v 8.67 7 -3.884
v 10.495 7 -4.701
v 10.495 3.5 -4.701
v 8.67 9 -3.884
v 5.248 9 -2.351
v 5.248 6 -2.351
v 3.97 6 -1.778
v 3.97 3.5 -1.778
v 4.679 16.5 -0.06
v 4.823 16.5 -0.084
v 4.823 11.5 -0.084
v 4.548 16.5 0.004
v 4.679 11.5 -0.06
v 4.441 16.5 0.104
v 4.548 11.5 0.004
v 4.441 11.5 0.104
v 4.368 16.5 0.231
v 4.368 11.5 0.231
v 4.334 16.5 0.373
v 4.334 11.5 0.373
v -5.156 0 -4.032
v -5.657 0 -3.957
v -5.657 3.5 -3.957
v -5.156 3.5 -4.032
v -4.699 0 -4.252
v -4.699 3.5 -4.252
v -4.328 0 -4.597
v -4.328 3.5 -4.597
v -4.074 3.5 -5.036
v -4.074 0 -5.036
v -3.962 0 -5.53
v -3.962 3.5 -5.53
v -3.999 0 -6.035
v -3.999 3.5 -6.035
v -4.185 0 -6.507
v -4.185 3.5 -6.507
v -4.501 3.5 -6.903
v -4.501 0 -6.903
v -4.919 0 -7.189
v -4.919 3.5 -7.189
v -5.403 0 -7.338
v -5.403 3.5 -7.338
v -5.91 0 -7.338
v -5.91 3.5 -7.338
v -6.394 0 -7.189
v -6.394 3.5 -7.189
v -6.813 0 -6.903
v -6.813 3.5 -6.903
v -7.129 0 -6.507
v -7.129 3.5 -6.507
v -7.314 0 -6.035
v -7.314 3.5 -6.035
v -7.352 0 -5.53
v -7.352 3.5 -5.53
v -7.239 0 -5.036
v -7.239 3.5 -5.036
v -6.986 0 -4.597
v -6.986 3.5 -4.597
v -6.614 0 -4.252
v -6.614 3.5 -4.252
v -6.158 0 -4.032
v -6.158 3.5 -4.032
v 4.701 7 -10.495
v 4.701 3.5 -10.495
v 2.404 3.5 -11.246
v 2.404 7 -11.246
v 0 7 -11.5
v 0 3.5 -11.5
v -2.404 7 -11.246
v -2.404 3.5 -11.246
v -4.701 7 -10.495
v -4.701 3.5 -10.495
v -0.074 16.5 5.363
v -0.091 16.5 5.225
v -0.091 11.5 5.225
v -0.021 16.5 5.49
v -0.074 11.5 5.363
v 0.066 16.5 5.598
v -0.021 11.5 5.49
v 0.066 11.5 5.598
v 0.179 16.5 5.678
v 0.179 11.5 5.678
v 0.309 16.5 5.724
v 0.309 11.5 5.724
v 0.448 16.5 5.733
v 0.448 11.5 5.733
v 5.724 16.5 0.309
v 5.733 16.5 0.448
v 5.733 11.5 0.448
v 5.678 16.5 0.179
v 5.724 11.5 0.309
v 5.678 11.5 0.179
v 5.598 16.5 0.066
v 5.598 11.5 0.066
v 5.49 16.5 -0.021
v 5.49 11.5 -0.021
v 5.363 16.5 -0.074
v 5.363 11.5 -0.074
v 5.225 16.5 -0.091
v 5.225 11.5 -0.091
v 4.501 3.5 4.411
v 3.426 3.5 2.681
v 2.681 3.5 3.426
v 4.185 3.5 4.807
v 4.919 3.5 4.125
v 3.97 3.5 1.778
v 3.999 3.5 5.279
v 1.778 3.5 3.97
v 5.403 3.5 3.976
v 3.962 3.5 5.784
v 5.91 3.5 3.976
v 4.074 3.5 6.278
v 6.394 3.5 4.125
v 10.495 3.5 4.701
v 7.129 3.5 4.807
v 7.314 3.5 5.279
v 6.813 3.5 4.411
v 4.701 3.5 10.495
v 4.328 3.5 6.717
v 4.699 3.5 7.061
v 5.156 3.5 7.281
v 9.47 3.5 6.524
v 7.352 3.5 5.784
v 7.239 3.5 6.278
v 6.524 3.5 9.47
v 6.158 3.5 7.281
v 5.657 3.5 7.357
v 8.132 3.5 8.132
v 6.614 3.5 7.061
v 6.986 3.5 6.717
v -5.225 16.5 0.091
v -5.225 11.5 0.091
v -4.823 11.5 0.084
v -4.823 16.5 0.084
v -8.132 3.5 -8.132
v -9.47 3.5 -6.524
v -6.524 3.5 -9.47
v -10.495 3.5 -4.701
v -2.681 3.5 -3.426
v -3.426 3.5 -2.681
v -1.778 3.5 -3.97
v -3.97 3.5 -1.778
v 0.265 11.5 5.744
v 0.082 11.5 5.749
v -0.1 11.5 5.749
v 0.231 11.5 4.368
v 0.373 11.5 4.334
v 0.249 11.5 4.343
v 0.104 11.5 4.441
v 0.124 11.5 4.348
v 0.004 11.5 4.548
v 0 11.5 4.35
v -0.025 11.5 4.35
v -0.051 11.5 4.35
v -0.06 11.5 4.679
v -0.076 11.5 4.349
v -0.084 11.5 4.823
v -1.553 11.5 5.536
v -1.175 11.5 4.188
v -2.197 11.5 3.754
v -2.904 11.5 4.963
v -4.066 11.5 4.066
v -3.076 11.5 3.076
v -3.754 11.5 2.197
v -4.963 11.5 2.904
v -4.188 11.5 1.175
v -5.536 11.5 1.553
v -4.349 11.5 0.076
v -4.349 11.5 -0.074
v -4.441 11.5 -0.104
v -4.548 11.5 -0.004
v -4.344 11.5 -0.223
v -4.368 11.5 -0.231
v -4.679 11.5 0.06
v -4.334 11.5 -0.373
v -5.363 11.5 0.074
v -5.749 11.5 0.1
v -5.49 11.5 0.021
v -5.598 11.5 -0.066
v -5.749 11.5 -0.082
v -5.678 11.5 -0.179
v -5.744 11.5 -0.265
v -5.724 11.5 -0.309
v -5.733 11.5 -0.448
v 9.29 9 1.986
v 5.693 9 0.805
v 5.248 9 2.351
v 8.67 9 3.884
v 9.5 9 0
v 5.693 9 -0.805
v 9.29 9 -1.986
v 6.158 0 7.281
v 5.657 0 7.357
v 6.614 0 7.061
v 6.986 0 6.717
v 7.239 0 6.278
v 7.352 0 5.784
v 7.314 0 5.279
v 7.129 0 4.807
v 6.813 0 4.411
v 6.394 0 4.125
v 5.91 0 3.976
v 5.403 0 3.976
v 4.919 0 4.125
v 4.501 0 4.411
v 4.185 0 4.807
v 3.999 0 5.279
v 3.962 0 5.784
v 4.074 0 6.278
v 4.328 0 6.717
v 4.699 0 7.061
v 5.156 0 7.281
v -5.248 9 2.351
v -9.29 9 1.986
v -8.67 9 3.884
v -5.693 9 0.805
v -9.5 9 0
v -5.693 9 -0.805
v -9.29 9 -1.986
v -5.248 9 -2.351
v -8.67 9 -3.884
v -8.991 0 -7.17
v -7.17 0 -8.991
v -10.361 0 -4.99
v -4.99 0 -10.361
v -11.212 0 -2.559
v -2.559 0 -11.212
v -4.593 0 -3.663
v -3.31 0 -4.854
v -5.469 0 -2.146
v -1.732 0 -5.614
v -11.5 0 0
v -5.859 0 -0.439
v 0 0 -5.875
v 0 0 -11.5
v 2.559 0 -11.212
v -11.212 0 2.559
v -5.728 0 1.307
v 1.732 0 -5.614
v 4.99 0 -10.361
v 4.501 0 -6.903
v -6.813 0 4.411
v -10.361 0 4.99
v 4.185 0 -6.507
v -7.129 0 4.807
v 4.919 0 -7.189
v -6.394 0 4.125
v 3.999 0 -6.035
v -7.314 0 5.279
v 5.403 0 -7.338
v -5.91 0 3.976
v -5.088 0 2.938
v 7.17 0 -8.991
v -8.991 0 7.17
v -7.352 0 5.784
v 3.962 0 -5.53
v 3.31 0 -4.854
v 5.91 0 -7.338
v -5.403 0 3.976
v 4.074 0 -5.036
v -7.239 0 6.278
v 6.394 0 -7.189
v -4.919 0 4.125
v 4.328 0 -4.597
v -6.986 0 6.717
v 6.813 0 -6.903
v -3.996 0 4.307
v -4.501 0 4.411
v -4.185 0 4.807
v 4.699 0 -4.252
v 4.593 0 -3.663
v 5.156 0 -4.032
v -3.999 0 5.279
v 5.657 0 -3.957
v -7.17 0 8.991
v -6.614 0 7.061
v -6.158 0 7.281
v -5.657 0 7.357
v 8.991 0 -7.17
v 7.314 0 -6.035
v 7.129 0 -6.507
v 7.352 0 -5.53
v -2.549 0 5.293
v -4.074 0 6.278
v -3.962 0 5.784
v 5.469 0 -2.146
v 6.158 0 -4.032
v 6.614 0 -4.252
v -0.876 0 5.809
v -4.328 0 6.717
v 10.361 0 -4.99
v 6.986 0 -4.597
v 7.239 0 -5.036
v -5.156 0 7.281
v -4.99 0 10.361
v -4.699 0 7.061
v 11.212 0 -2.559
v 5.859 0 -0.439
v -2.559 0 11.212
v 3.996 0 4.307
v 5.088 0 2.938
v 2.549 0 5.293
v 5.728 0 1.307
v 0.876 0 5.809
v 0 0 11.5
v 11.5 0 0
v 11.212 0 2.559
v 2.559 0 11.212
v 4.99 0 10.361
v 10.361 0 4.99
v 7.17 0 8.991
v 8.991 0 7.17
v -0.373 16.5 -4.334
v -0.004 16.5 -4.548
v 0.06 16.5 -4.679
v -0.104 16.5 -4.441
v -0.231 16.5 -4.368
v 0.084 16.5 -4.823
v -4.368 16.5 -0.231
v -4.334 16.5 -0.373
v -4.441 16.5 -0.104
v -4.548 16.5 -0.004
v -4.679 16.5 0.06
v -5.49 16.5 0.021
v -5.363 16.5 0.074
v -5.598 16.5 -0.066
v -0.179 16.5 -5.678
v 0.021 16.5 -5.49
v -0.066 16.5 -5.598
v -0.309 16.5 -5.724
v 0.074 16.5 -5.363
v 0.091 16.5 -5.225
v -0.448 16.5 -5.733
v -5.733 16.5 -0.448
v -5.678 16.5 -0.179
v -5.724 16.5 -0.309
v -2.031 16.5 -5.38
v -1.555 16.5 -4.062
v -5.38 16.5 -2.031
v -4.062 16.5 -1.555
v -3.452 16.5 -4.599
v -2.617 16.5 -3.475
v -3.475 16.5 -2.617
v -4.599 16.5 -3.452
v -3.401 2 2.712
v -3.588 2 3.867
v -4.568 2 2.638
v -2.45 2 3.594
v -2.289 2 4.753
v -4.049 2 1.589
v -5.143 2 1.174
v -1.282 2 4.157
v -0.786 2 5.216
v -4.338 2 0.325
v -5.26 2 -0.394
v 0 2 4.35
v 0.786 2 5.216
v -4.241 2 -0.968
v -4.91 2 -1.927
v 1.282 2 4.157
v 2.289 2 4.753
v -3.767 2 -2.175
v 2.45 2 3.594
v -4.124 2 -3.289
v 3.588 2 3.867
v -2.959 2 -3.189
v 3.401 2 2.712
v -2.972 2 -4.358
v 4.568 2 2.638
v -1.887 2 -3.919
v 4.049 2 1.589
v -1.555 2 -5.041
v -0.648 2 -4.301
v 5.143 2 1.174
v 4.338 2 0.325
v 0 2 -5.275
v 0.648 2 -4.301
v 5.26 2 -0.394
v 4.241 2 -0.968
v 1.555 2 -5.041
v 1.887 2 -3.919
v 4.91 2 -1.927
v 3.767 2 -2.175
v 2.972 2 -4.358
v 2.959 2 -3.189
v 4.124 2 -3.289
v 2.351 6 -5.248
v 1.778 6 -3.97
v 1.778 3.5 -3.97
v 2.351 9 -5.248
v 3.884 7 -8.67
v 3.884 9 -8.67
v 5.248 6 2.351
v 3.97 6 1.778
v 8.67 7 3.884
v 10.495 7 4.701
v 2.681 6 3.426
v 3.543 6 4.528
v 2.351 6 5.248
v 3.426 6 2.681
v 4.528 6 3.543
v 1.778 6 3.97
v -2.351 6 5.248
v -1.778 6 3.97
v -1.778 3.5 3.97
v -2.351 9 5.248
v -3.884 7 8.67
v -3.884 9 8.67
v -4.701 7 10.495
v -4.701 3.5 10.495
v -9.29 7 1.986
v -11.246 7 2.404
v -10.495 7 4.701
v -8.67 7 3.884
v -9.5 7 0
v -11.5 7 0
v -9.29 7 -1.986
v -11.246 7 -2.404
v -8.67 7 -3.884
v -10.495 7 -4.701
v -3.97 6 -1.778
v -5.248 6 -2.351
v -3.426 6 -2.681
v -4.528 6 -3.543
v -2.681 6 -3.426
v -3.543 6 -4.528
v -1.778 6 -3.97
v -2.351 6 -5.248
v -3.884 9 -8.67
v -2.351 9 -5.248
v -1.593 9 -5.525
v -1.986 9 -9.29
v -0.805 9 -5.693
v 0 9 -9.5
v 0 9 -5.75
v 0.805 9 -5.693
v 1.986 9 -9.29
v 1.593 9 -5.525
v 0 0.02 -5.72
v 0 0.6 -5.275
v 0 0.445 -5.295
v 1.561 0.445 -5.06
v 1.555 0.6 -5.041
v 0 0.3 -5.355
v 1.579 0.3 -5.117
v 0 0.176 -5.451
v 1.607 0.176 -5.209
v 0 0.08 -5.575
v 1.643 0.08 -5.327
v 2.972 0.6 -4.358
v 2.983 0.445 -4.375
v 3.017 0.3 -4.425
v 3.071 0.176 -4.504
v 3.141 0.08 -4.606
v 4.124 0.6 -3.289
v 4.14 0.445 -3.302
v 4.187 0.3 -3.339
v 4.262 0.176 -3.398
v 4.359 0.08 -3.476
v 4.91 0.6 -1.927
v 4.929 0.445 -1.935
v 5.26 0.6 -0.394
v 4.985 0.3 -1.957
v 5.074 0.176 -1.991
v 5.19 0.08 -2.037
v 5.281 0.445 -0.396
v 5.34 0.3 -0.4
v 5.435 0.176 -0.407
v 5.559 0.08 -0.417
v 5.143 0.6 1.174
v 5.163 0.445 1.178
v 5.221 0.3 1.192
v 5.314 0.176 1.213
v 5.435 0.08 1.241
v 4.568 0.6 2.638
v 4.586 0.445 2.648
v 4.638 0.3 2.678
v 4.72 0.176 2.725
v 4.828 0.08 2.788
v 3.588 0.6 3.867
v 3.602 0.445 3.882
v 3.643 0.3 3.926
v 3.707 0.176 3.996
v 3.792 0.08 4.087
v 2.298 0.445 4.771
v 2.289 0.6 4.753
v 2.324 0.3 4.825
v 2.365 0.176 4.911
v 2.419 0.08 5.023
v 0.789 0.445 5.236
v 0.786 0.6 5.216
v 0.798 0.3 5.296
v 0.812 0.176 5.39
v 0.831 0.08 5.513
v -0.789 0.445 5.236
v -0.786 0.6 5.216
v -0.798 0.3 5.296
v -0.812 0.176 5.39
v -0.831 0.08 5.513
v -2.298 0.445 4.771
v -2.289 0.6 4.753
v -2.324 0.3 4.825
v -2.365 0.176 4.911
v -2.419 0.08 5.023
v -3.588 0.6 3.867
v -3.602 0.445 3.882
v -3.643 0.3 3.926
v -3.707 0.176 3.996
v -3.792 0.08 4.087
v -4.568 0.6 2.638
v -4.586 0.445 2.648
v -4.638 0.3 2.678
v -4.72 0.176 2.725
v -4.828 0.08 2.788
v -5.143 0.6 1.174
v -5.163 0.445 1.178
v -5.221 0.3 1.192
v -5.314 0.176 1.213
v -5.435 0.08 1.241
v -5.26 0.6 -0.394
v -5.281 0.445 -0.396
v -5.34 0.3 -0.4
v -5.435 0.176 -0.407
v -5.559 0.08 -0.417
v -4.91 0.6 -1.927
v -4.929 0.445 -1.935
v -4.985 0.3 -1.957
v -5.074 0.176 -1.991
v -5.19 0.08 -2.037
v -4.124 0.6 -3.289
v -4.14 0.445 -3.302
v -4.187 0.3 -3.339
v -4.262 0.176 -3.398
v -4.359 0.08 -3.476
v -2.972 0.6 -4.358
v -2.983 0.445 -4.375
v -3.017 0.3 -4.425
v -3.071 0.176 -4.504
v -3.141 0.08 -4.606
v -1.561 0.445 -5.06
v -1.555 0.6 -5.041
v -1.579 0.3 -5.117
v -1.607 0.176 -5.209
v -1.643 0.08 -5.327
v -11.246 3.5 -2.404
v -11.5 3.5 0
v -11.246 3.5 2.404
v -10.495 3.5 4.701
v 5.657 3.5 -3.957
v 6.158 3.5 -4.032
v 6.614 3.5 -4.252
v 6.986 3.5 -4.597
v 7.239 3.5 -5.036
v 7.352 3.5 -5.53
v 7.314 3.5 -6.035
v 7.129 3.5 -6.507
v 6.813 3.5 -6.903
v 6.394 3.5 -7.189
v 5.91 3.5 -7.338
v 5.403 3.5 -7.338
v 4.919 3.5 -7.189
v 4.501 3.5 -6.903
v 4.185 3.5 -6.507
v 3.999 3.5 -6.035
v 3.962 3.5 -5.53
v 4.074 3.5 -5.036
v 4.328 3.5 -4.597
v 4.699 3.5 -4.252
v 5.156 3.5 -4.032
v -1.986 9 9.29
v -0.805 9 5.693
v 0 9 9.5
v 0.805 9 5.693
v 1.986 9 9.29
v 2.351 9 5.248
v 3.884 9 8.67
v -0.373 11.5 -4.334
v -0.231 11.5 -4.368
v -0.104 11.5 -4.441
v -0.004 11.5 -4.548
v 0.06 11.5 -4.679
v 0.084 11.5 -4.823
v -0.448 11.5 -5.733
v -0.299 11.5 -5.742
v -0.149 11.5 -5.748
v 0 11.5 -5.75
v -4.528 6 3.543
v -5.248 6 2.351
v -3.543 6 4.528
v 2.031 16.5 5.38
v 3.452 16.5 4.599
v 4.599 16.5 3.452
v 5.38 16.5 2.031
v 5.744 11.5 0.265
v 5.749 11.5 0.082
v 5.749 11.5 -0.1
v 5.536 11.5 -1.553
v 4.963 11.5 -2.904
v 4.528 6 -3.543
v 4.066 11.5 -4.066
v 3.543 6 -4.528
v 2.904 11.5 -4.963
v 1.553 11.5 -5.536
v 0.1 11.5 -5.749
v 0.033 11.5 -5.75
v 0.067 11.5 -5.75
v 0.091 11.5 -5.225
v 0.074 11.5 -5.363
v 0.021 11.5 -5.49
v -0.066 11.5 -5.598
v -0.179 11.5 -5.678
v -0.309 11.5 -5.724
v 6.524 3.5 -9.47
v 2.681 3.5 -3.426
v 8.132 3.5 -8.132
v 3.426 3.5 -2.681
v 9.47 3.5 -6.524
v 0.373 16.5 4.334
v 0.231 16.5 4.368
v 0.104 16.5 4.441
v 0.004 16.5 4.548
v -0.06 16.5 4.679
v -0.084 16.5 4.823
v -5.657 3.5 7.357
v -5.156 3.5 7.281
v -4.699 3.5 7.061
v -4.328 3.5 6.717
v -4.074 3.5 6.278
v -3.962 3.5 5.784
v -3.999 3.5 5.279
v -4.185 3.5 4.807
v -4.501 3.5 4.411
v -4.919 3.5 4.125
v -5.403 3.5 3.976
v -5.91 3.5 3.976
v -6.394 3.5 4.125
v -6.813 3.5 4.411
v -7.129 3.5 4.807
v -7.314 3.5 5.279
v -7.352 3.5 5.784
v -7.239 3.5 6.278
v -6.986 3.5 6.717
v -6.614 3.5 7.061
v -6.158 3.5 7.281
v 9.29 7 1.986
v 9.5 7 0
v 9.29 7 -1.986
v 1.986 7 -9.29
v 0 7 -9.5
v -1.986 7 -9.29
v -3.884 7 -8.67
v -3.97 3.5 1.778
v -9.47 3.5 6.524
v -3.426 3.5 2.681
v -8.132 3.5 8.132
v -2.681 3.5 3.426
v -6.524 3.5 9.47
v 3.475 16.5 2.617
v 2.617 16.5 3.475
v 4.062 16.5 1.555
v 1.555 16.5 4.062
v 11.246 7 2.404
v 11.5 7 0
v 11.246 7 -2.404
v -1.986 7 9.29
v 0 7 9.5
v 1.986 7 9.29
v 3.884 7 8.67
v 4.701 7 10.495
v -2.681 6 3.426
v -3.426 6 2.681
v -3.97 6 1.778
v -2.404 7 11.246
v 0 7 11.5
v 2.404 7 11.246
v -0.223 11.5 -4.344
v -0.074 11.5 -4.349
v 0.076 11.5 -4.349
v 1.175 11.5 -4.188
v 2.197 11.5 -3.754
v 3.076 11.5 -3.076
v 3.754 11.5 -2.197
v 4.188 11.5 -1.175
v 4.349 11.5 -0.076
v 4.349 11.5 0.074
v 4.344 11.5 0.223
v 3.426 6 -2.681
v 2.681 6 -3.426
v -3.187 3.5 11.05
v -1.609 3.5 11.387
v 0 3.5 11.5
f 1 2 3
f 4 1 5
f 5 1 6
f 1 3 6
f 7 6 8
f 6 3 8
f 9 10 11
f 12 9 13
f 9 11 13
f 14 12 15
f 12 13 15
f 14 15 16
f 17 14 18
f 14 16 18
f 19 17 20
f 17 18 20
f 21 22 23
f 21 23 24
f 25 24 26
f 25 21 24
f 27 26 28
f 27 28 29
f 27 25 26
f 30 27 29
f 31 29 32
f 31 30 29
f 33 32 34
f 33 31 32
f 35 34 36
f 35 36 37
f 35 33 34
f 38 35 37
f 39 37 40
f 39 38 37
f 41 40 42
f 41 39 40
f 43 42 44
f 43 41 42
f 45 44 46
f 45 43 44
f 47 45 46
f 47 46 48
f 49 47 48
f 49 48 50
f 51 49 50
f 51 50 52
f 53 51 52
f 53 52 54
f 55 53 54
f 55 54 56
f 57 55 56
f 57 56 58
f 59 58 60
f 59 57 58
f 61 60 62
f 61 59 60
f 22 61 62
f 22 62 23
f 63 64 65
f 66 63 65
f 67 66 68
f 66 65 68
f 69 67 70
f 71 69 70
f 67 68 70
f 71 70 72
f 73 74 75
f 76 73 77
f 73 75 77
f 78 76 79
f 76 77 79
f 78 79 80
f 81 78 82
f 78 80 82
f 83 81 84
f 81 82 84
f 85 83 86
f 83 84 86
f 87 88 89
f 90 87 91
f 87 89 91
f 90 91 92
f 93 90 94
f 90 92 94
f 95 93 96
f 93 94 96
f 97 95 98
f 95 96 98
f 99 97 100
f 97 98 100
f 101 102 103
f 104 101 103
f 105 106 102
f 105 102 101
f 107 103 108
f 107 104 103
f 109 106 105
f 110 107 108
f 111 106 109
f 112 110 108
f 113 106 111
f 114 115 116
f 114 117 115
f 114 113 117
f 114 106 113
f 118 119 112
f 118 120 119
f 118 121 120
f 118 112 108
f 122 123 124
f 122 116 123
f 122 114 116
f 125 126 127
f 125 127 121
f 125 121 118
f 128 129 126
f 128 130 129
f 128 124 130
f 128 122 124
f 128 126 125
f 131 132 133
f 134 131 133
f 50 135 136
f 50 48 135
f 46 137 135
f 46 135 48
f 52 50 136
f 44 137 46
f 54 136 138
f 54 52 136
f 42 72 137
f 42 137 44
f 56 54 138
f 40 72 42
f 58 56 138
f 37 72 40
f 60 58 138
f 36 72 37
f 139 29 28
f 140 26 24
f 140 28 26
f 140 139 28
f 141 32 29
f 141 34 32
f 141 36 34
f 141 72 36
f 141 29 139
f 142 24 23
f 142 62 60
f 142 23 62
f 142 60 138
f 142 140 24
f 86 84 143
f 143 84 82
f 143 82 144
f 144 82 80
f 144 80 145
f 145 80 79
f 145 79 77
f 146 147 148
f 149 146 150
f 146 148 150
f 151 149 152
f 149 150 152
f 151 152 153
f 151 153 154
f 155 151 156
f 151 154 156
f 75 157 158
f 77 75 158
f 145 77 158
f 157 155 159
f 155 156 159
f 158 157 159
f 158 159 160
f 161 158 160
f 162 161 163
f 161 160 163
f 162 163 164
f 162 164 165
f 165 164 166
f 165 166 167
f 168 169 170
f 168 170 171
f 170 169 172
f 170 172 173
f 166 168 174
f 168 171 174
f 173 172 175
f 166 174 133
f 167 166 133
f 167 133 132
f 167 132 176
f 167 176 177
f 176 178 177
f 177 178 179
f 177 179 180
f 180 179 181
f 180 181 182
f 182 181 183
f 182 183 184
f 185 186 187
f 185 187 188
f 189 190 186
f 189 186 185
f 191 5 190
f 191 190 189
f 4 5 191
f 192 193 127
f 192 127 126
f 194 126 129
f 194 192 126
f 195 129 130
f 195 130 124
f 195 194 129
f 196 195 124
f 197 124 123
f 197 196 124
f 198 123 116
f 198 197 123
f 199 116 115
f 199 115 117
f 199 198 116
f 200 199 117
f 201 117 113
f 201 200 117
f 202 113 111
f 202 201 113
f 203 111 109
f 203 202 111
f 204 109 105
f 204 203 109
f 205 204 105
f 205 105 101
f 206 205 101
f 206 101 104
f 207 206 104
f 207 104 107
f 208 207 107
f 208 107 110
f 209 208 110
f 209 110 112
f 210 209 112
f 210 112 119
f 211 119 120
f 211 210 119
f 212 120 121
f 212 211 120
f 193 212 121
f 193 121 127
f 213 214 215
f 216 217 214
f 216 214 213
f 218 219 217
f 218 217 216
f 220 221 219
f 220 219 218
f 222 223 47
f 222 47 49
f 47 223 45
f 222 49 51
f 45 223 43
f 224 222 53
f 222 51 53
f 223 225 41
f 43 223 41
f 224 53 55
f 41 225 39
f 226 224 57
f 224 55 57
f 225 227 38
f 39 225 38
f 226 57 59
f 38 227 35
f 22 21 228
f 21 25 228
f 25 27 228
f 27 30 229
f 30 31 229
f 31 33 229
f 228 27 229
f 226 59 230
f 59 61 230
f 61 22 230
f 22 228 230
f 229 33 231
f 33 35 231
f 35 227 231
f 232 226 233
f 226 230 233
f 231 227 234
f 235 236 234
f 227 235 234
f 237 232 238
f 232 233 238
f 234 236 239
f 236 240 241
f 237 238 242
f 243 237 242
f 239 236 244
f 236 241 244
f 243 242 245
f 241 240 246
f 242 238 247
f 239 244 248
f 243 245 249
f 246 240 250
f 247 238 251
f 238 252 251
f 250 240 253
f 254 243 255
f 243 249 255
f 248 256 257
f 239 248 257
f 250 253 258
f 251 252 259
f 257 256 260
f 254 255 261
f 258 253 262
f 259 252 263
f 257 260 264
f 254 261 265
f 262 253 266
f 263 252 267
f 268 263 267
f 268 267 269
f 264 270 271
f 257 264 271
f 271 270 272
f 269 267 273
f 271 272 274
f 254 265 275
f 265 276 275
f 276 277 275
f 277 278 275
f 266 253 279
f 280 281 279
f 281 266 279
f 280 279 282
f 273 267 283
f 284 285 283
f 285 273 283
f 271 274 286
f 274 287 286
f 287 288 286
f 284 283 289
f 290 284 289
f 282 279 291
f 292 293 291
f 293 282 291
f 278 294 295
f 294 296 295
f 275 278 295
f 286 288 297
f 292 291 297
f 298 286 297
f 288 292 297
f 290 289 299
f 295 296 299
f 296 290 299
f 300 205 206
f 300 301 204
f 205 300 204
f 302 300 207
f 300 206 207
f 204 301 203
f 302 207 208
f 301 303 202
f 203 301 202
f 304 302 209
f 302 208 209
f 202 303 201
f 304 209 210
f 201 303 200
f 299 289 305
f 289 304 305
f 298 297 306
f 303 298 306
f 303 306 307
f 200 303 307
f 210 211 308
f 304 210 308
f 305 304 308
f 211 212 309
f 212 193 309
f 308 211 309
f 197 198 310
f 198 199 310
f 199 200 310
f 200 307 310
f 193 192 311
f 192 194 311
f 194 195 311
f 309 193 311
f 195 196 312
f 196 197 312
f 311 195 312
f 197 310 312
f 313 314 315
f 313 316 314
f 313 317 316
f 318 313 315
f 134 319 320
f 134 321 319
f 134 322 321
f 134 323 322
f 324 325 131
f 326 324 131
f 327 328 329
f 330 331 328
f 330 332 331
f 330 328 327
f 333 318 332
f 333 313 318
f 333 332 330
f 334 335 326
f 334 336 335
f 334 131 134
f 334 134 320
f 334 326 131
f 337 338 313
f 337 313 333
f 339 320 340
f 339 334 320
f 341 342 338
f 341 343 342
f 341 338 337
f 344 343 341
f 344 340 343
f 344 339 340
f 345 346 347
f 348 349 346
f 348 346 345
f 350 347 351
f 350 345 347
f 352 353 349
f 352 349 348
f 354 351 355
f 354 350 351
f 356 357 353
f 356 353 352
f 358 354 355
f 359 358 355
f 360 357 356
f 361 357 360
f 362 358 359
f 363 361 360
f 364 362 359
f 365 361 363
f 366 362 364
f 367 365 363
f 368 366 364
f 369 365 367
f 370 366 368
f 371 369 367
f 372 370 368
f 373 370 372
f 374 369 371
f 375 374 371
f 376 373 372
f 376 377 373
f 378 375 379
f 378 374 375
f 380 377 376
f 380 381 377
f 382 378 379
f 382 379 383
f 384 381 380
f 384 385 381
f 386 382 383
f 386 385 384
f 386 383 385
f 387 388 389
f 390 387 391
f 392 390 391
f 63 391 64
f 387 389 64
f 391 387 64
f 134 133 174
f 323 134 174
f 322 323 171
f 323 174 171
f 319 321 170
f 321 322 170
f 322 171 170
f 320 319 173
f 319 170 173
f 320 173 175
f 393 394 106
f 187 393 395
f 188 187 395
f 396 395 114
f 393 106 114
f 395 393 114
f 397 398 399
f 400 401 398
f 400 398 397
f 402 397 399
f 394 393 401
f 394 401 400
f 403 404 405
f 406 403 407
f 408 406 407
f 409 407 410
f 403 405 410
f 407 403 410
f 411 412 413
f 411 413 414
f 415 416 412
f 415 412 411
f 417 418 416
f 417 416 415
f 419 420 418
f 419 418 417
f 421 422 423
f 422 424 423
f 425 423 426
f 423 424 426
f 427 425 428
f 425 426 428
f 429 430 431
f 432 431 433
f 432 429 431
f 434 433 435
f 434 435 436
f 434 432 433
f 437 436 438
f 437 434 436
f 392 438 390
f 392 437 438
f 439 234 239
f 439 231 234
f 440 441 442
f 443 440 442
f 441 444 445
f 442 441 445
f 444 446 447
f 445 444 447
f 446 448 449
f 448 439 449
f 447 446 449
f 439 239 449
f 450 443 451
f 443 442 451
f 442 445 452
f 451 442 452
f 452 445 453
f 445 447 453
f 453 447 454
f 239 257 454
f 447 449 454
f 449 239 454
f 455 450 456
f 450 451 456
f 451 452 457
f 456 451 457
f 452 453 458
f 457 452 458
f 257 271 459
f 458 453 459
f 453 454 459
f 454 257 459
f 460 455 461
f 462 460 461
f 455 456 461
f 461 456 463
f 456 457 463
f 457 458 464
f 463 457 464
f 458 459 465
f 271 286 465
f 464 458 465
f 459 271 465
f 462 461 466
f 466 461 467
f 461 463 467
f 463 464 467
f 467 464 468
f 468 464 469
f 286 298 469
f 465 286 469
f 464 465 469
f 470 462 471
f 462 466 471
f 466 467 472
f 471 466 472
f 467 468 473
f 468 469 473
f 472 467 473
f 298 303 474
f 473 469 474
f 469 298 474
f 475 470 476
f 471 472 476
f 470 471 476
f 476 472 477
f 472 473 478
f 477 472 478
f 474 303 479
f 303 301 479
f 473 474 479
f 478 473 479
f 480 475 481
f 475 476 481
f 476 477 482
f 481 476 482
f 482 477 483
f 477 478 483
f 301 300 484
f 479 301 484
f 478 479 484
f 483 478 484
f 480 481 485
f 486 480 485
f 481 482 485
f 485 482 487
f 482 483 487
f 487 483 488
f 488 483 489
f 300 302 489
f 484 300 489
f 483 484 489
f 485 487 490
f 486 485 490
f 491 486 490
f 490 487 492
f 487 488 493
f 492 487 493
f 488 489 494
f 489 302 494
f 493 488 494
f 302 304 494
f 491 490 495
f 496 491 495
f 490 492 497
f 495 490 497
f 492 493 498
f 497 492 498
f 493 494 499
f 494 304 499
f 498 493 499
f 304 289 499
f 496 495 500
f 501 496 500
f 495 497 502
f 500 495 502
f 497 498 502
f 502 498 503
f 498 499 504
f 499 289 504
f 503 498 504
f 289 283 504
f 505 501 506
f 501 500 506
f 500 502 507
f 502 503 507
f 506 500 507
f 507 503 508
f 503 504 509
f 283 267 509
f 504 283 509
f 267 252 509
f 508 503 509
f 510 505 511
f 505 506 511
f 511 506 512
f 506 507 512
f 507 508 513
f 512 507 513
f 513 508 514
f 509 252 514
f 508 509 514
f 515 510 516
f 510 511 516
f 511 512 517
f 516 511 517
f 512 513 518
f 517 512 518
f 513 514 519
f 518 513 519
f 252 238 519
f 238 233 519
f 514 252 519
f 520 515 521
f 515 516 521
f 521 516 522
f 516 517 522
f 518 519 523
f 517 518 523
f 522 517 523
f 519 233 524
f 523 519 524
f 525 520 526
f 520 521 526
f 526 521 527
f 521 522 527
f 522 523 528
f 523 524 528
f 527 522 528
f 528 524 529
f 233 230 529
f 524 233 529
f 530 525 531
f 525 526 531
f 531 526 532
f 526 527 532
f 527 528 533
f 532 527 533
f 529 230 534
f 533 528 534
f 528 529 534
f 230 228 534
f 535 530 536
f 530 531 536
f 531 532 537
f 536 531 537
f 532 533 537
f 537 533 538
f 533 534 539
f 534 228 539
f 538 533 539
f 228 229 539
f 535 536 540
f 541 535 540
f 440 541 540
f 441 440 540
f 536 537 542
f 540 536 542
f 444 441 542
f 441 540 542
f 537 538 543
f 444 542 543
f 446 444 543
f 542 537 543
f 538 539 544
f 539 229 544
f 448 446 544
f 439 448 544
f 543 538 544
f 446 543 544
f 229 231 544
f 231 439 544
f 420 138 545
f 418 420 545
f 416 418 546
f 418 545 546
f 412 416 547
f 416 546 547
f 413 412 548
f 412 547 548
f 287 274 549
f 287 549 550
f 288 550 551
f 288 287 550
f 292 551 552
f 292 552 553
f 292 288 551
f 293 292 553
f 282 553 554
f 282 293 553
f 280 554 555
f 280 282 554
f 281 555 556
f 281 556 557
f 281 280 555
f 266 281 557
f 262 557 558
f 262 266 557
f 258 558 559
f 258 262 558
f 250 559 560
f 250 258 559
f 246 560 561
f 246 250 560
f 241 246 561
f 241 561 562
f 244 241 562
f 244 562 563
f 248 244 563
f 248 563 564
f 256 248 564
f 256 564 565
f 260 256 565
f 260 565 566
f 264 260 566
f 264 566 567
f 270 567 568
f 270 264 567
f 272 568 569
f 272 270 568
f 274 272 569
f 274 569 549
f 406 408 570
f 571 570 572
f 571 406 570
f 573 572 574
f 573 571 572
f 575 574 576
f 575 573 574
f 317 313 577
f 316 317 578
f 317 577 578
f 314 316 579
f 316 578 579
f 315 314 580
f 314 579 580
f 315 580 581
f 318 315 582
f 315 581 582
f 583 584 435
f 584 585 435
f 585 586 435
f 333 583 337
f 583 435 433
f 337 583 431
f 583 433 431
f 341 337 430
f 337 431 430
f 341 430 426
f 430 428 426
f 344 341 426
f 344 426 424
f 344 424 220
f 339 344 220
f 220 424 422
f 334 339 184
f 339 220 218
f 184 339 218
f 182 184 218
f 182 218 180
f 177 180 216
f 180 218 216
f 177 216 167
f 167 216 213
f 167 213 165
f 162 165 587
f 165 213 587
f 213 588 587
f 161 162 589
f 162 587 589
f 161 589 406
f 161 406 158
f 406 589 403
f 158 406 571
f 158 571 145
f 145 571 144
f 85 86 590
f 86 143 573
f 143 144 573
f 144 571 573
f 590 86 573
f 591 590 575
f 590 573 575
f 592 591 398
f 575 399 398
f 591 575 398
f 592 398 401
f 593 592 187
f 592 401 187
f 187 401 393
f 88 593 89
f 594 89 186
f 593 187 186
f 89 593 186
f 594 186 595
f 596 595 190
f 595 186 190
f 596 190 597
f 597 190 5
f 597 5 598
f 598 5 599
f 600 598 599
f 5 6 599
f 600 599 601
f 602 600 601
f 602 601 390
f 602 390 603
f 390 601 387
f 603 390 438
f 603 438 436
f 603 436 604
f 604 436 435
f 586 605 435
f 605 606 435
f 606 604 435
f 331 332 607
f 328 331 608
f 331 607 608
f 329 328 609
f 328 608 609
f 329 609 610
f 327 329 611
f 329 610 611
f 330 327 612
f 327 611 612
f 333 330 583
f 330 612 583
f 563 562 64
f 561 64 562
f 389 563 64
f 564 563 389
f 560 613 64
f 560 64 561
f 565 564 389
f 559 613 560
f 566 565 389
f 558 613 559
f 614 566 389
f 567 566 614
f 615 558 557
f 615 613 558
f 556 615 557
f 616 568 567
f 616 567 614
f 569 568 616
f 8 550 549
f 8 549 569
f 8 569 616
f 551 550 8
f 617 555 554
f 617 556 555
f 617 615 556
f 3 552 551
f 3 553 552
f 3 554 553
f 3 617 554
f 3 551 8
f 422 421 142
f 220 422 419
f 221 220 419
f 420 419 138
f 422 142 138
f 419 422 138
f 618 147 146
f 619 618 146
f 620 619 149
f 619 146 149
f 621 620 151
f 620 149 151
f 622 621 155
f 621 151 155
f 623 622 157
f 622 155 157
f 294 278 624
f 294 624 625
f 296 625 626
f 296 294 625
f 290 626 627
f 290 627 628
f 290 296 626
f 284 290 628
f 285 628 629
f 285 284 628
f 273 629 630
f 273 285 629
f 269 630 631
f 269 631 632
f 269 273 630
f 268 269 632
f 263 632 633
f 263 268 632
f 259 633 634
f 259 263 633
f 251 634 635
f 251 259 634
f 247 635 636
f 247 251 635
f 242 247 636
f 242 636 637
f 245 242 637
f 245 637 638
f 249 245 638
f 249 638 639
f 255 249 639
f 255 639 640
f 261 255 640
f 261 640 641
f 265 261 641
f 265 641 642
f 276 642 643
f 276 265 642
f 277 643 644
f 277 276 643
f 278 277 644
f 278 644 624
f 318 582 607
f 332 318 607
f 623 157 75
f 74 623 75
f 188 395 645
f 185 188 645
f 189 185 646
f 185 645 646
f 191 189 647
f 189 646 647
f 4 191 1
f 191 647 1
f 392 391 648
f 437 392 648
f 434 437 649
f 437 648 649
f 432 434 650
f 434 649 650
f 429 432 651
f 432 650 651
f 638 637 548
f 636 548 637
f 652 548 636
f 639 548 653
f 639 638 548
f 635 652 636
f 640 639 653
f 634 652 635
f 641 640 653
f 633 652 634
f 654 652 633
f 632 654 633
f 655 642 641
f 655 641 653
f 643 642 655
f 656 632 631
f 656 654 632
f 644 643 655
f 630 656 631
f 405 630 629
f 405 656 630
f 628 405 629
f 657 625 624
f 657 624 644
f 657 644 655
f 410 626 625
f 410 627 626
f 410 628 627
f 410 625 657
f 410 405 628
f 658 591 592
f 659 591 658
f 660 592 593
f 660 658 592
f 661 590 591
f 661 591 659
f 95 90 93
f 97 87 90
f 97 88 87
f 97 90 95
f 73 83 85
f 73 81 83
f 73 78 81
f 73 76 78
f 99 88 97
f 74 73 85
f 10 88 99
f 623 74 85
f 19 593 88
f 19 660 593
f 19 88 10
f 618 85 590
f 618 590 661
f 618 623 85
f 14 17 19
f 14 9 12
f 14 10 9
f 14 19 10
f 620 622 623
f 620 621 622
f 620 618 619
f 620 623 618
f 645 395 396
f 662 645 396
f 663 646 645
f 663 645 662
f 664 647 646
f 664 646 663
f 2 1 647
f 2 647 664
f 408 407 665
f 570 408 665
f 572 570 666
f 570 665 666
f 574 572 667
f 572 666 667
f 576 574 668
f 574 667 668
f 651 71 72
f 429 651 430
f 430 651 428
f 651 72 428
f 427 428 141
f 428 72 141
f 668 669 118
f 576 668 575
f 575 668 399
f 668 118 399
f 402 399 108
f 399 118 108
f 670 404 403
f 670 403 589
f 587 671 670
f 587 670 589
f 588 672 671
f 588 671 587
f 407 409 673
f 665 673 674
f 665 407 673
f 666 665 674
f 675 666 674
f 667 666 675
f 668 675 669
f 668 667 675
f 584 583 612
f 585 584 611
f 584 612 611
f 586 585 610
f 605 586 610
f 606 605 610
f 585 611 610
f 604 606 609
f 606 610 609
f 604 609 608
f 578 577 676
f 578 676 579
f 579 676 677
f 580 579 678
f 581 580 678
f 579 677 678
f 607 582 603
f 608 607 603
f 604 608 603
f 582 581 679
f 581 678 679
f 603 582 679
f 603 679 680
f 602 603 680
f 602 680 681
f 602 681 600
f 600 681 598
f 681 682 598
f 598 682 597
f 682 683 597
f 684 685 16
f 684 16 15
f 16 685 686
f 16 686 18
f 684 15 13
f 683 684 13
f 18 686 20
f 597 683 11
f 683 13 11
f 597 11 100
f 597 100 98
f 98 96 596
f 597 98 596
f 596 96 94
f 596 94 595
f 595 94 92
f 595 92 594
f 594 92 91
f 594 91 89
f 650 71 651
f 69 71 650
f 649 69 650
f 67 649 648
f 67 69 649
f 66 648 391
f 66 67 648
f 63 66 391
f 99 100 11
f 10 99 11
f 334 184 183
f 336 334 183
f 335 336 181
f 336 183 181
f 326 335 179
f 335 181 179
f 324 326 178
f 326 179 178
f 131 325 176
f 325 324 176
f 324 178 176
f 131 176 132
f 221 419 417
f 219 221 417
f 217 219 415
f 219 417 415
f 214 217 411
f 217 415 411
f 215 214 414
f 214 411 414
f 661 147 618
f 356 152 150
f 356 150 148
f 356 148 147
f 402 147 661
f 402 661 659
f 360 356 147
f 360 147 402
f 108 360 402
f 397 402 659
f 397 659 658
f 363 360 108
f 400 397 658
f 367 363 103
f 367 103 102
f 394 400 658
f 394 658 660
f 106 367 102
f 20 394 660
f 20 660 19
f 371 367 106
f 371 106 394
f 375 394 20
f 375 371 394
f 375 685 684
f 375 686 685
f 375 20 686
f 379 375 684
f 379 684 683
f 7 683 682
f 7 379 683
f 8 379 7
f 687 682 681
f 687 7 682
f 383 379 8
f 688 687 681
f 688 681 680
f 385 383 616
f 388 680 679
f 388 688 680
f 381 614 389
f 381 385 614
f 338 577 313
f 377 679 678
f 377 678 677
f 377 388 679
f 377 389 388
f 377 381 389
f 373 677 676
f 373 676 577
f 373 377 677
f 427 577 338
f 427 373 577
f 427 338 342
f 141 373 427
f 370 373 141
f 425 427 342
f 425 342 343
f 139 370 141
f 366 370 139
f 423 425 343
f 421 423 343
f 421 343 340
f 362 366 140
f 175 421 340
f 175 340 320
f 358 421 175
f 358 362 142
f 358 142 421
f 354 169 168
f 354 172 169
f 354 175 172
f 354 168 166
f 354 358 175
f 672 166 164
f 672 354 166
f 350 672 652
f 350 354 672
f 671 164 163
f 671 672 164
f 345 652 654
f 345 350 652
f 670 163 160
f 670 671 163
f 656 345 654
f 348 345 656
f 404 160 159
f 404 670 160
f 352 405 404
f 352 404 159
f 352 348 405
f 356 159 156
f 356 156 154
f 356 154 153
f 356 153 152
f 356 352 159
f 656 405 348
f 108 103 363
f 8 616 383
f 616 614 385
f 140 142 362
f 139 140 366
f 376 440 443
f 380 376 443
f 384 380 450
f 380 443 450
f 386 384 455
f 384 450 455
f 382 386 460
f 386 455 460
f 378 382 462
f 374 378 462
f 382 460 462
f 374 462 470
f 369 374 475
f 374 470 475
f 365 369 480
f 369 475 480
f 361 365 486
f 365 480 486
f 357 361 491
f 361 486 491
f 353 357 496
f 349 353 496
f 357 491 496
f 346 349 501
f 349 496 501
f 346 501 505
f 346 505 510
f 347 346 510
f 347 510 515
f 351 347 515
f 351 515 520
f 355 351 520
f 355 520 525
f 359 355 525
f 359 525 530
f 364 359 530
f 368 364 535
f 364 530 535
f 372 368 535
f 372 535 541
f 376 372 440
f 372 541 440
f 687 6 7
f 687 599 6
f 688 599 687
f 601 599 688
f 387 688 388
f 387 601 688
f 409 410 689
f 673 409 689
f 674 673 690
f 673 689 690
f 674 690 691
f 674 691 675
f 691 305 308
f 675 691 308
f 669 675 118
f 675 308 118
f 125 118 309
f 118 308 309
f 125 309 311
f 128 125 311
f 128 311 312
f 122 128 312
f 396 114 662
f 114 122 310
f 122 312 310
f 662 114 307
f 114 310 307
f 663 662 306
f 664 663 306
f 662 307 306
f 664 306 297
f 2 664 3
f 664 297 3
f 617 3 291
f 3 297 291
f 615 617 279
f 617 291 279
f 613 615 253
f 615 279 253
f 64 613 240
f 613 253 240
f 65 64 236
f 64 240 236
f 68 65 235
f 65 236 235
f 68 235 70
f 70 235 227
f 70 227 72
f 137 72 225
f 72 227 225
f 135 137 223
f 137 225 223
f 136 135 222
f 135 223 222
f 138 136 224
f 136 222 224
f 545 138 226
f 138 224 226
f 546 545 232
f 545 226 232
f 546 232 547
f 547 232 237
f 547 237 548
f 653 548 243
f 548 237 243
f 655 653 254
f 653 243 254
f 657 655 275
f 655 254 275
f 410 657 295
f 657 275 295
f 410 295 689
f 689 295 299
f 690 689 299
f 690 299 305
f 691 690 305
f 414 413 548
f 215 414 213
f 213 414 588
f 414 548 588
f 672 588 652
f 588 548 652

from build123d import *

# Parameters (mm, degrees)
CROQUIS1_R              = 11.5
CROQUIS1_R_2            = 4.35
CROQUIS1_R_3            = 1.7000000000000004
SALIENTE_EXTRUIR1_DEPTH = 3.5
CROQUIS2_R              = 5.75
CROQUIS2_R_2            = 4.35
SALIENTE_EXTRUIR2_DEPTH = 13
CORTAR_EXTRUIR1_START   = -5
CORTAR_EXTRUIR1_DEPTH   = 5
CROQUIS4_R              = 5.275
CROQUIS4_R_2            = 4.35
CORTAR_EXTRUIR2_DEPTH   = 2
REDONDEO1_R             = 0.6
REDONDEO2_R             = 0.5
SALIENTE_EXTRUIR3_DEPTH = 3.5
SALIENTE_EXTRUIR4_DEPTH = 2
CORTAR_EXTRUIR3_DEPTH   = 2.5


with BuildPart() as part:
    # Croquis1 → Saliente-Extruir1 (new body)
    with BuildSketch(Plane(origin=(0, 0, 0), x_dir=(1, 0, 0), z_dir=(0, 1, 0))):
        with Locations(Location((1.731948e-11, 0, 0), (0, 0, 270))):
            Circle(CROQUIS1_R)
        with Locations(Location((1.731948e-11, 0, 0), (0, 0, 270))):
            Circle(CROQUIS1_R_2, mode=Mode.SUBTRACT)
        with Locations(Location((5.656854249492441, 5.65685424949238, 0), (0, 0, 270))):
            Circle(CROQUIS1_R_3, mode=Mode.SUBTRACT)
        with Locations(Location((-5.656854249492318, 5.656854249492381, 0), (0, 0, 270))):
            Circle(CROQUIS1_R_3, mode=Mode.SUBTRACT)
        with Locations(Location((-5.656854249492318, -5.656854249492381, 0), (0, 0, 270))):
            Circle(CROQUIS1_R_3, mode=Mode.SUBTRACT)
        with Locations(Location((5.656854249492441, -5.65685424949238, 0), (0, 0, 270))):
            Circle(CROQUIS1_R_3, mode=Mode.SUBTRACT)
    extrude(amount=SALIENTE_EXTRUIR1_DEPTH)

    # Croquis2 → Saliente-Extruir2 (add)
    with BuildSketch(Plane(origin=(0, 3.5, 0), x_dir=(1, 0, 0), z_dir=(0, 1, 6e-17))):
        with Locations(Location((1.731948e-11, 0, 0), (0, 0, 90))):
            Circle(CROQUIS2_R)
        with Locations(Location((1.731948e-11, 0, 0), (0, 0, 270))):
            Circle(CROQUIS2_R_2, mode=Mode.SUBTRACT)
    extrude(amount=SALIENTE_EXTRUIR2_DEPTH)

    # Croquis3 → Cortar-Extruir1 (cut)
    with BuildSketch(Plane(origin=(0, 16.5, 1.01e-15), x_dir=(1, 0, 0), z_dir=(0, 1, 6e-17)).offset(CORTAR_EXTRUIR1_START)):
        with BuildLine():
            Line((-5.7491242471489485, -0.10035133701439494), (-4.3493374739299995, -0.07591796800219403))
            ThreePointArc((-4.3493374739299995, -0.07591796800219403), (-3.0759144981612514, -3.0759144981612847), (-0.07591796800214497, -4.34933747393))
            Line((-0.07591796800214497, -4.34933747393), (-0.10035133701433126, -5.7491242471489485))
            ThreePointArc((-0.10035133701433126, -5.7491242471489485), (-4.065863991822413, -4.065863991822457), (-5.7491242471489485, -0.10035133701439494))
        make_face()
        with BuildLine():
            Line((5.749124247183587, 0.10035133701435339), (4.349337473964638, 0.07591796800216172))
            ThreePointArc((4.349337473964638, 0.07591796800216172), (3.075914498198222, 3.0759144981732933), (0.07591796803681536, 4.3493374739299995))
            Line((0.07591796803681536, 4.3493374739299995), (0.10035133704901177, 5.749124247148948))
            ThreePointArc((0.10035133704901177, 5.749124247148948), (4.06586399185939, 4.065863991834459), (5.749124247183587, 0.10035133701435339))
        make_face()
    extrude(amount=CORTAR_EXTRUIR1_DEPTH, mode=Mode.SUBTRACT)

    # Croquis4 → Cortar-Extruir2 (cut)
    with BuildSketch(Plane.XZ):
        with Locations(Location((1.731948e-11, 0, 0), (0, 0, 270))):
            Circle(CROQUIS4_R)
        with Locations(Location((1.731948e-11, 0, 0), (0, 0, 270))):
            Circle(CROQUIS4_R_2, mode=Mode.SUBTRACT)
    extrude(amount=-CORTAR_EXTRUIR2_DEPTH, mode=Mode.SUBTRACT)

    # Redondeo1
    redondeo1_edges = [part.edges().sort_by_distance(p)[0] for p in [
        (1.732109e-11, 0, 5.275),
    ]]
    fillet(redondeo1_edges, radius=REDONDEO1_R)

    # Redondeo2
    # the kernel refuses this fillet: 0.5 mm, written as the material it takes off along each edge
    with BuildSketch(Plane(origin=(-0.10035133701433126, 11.5, 5.749124247148949), x_dir=(0.017452406437275973, 0, -0.9998476951563914), z_dir=(0, 1, 6e-17))) as redondeo2_piece_1:
        with BuildLine():
            CenterArc((0.5238637599066267, -0.5000000000000001), REDONDEO2_R, 90.00000000000004, 95.46502379971594)
            ThreePointArc((0.02613649894535296, -0.5476190476173979), (0.00653784155089456, -0.27412120398217477), (0, 0))
            Line((0, 0), (0.5238637599066264, 0))
        make_face()
    extrude(amount=6.3706060199107775, mode=Mode.SUBTRACT)
    with BuildSketch(Plane(origin=(-5.7491242471489485, 11.5, 0.10035133701439544), x_dir=(0.9998476951563913, 0, -0.01745240643728594), z_dir=(0, 1, 6e-17))) as redondeo2_piece_2:
        with BuildLine():
            CenterArc((0.5238637599253263, 0.5), REDONDEO2_R, 174.53497620009085, 95.46502379990915)
            ThreePointArc((0.02613649896421286, 0.5476190476190762), (0.00653784156877282, 0.2741212039826321), (0, 0))
            Line((0, 0), (0.5238637599253264, 0))
        make_face()
    extrude(amount=6.3706060199172185, mode=Mode.SUBTRACT)
    with BuildSketch(Plane(origin=(-4.3493374739299995, 11.5, 0.07591796800219473), x_dir=(0.03417818793243372, 0, -0.9994157550637548), z_dir=(0, 1, 6e-17))) as redondeo2_piece_3:
        with BuildLine():
            CenterArc((0.4748597695855003, 0.4993335237901514), REDONDEO2_R, 182.95864737806363, 84.08270524821285)
            Line((-0.02447375420269609, 0.47352592759711776), (0, 0))
            ThreePointArc((0, 0), (0.22452608671492605, 0.00579834302568299), (0.4490521734302907, 0))
        make_face()
    extrude(amount=6.18539489398967, mode=Mode.SUBTRACT)
    with BuildSketch(Plane(origin=(-0.07591796800214483, 11.5, 4.34933747393), x_dir=(0.9994157550651794, 0, -0.03417818789077768), z_dir=(0, 1, 6e-17))) as redondeo2_piece_4:
        with BuildLine():
            CenterArc((0.4748597696053468, -0.4993335237891691), REDONDEO2_R, 92.95864737590307, 84.082705248422)
            Line((-0.02447375418392556, -0.47352592761695317), (0, 0))
            ThreePointArc((0, 0), (0.22452608671557137, -0.0057983430342235), (0.44905217343114273, 0))
        make_face()
    extrude(amount=6.185394894036769, mode=Mode.SUBTRACT)
    with BuildSketch(Plane(origin=(0.10035133704901178, 11.5, -5.749124247148948), x_dir=(-0.017452406437283147, 0, 0.9998476951563912), z_dir=(0, 1, 6e-17))) as redondeo2_piece_5:
        with BuildLine():
            CenterArc((0.5238637599066267, -0.49999999999999994), REDONDEO2_R, 90.00000000000004, 95.46502379971594)
            ThreePointArc((0.02613649894535335, -0.5476190476173982), (0.00653784155089565, -0.27412120398217554), (0, 0))
            Line((0, 0), (0.5238637599066264, 0))
        make_face()
    extrude(amount=6.370606019910781, mode=Mode.SUBTRACT)
    with BuildSketch(Plane(origin=(5.749124247183587, 11.5, -0.10035133701435296), x_dir=(-0.9998476951563913, 0, 0.017452406437280254), z_dir=(0, 1, 6e-17))) as redondeo2_piece_6:
        with BuildLine():
            CenterArc((0.5238637599253252, 0.5000000000000001), REDONDEO2_R, 174.53497620009054, 95.46502379990937)
            ThreePointArc((0.02613649896421246, 0.5476190476190788), (0.00653784156877128, 0.27412120398263345), (0, 0))
            Line((0, 0), (0.5238637599253245, 0))
        make_face()
    extrude(amount=6.370606019917222, mode=Mode.SUBTRACT)
    with BuildSketch(Plane(origin=(4.349337473964638, 11.5, -0.07591796800216102), x_dir=(-0.03417818793243961, 0, 0.9994157550637546), z_dir=(0, 1, 6e-17))) as redondeo2_piece_7:
        with BuildLine():
            CenterArc((0.4748597695855018, 0.49933352379015083), REDONDEO2_R, 182.9586473780635, 84.08270524821285)
            Line((-0.02447375420269471, 0.4735259275971186), (0, 0))
            ThreePointArc((0, 0), (0.22452608671492558, 0.00579834302568341), (0.4490521734302912, 0))
        make_face()
    extrude(amount=6.185394893989674, mode=Mode.SUBTRACT)
    with BuildSketch(Plane(origin=(0.07591796803681525, 11.5, -4.349337473929999), x_dir=(-0.9994157550651797, 0, 0.03417818789076981), z_dir=(0, 1, 6e-17))) as redondeo2_piece_8:
        with BuildLine():
            CenterArc((0.47485976960534654, -0.4993335237891697), REDONDEO2_R, 92.9586473759031, 84.0827052484222)
            Line((-0.02447375418392593, -0.4735259276169559), (0, 0))
            ThreePointArc((0, 0), (0.22452608671556917, -0.00579834303422432), (0.4490521734311421, 0))
        make_face()
    extrude(amount=6.185394894036776, mode=Mode.SUBTRACT)

    # Croquis5 → Saliente-Extruir3 (add)
    with BuildSketch(Plane(origin=(0, 3.5, 0), x_dir=(1, 0, 0), z_dir=(0, 1, 6e-17))):
        with BuildLine():
            ThreePointArc((10.4951389110437, -4.701282722647084), (11.500000000017316, 2.423062e-11), (10.495138911023886, 4.701282722691312))
            Line((10.495138911023888, 4.701282722691313), (5.247569455520605, 2.350641361345657))
            ThreePointArc((5.247569455520605, 2.3506413613456574), (5.7500000000173195, 1.211642e-11), (5.247569455530511, -2.350641361323542))
            Line((5.247569455530511, -2.3506413613235417), (10.495138911043702, -4.701282722647084))
        make_face()
        with BuildLine():
            ThreePointArc((-4.701282722629764, -10.495138911026384), (4.155054e-11, -11.500000000000004), (4.701282722708632, -10.495138911006572))
            Line((4.701282722708633, -10.495138911006569), (2.3506413613629764, -5.247569455503285))
            ThreePointArc((2.3506413613629777, -5.247569455503285), (2.943645e-11, -5.75), (-2.350641361306222, -5.247569455513191))
            Line((-2.350641361306222, -5.247569455513191), (-4.701282722629764, -10.495138911026382))
        make_face()
        with BuildLine():
            ThreePointArc((4.701282722664406, 10.49513891102638), (-6.91114e-12, 11.5), (-4.701282722673994, 10.49513891100657))
            Line((-4.701282722673993, 10.495138911006569), (-2.3506413613283366, 5.247569455503284))
            ThreePointArc((-2.3506413613283352, 5.247569455503285), (5.20506e-12, 5.750000000000002), (2.3506413613408625, 5.24756945551319))
            Line((2.3506413613408625, 5.24756945551319), (4.701282722664406, 10.49513891102638))
        make_face()
        with BuildLine():
            ThreePointArc((-10.495138911009063, 4.7012827226470835), (-11.499999999982684, -2.423151e-11), (-10.49513891098925, -4.701282722691313))
            Line((-10.49513891098925, -4.701282722691314), (-5.247569455485966, -2.3506413613456574))
            ThreePointArc((-5.247569455485966, -2.3506413613456587), (-5.7499999999826805, -1.211753e-11), (-5.247569455495871, 2.3506413613235413))
            Line((-5.247569455495872, 2.3506413613235413), (-10.495138911009063, 4.7012827226470835))
        make_face()
    extrude(amount=SALIENTE_EXTRUIR3_DEPTH)

    # Croquis7 → Saliente-Extruir4 (add)
    with BuildSketch(Plane(origin=(0, 7, 4.8e-16), x_dir=(1, 0, 0), z_dir=(0, 1, 6e-17))):
        with BuildLine():
            Line((-5.247569455495871, 2.3506413613235413), (-8.669897361265344, 3.8836683360997637))
            ThreePointArc((-8.669897361265344, 3.8836683360997637), (-9.49999999998268, -2.001727e-11), (-8.669897361248976, -3.883668336136303))
            Line((-8.669897361248976, -3.883668336136303), (-5.247569455485966, -2.3506413613456574))
            ThreePointArc((-5.247569455485966, -2.3506413613456574), (-5.74999999998268, -1.211571e-11), (-5.247569455495871, 2.3506413613235413))
        make_face()
        with BuildLine():
            Line((2.3506413613408608, 5.24756945551319), (3.8836683361170823, 8.669897361282663))
            ThreePointArc((3.8836683361170823, 8.669897361282663), (-2.69837e-12, 9.5), (-3.883668336118984, 8.669897361266296))
            Line((-3.883668336118984, 8.669897361266296), (-2.3506413613283383, 5.247569455503285))
            ThreePointArc((-2.3506413613283383, 5.247569455503285), (5.20341e-12, 5.749999999999999), (2.3506413613408608, 5.24756945551319))
        make_face()
        with BuildLine():
            ThreePointArc((5.2475694555206065, 2.350641361345656), (5.7500000000173195, 1.211553e-11), (5.247569455530511, -2.350641361323542))
            Line((5.24756945553051, -2.3506413613235413), (8.669897361299984, -3.883668336099766))
            ThreePointArc((8.669897361299984, -3.883668336099768), (9.500000000017327, 2.001721e-11), (8.669897361283617, 3.883668336136305))
            Line((8.669897361283617, 3.883668336136302), (5.247569455520605, 2.3506413613456565))
        make_face()
        with BuildLine():
            Line((-2.350641361306222, -5.24756945551319), (-3.8836683360824447, -8.669897361282663))
            ThreePointArc((-3.8836683360824447, -8.669897361282663), (3.733849e-11, -9.5), (3.883668336153622, -8.669897361266296))
            Line((3.883668336153622, -8.669897361266296), (2.350641361362977, -5.247569455503285))
            ThreePointArc((2.350641361362977, -5.247569455503285), (2.943625e-11, -5.749999999999999), (-2.350641361306222, -5.24756945551319))
        make_face()
    extrude(amount=SALIENTE_EXTRUIR4_DEPTH)

    # Croquis8 → Cortar-Extruir3 (cut)
    with BuildSketch(Plane(origin=(0, 3.5, 0), x_dir=(1, 0, 0), z_dir=(0, 1, 6e-17))):
        with BuildLine():
            Line((-5.247569455495871, 2.3506413613235413), (-3.969900370675269, 1.7783112907404188))
            ThreePointArc((-3.969900370675269, 1.7783112907404188), (-3.0759144981506426, 3.075914498155002), (-1.7783112907398269, 3.9699003706850946))
            Line((-1.7783112907398269, 3.9699003706850946), (-2.3506413613283375, 5.247569455503285))
            ThreePointArc((-2.3506413613283375, 5.247569455503285), (-4.065863991813897, 4.065863991814082), (-5.247569455495871, 2.3506413613235413))
        make_face()
        with BuildLine():
            Line((5.247569455520605, 2.350641361345657), (3.969900370702414, 1.7783112907571466))
            ThreePointArc((3.969900370702414, 1.7783112907571466), (3.0759144981723208, 3.075914498167963), (1.778311290757738, 3.9699003706925886))
            Line((1.778311290757738, 3.9699003706925886), (2.3506413613408603, 5.24756945551319))
            ThreePointArc((2.3506413613408603, 5.24756945551319), (4.065863991831401, 4.0658639918312165), (5.247569455520605, 2.350641361345657))
        make_face()
        with BuildLine():
            Line((2.3506413613629764, -5.247569455503285), (1.7783112907744663, -3.9699003706850946))
            ThreePointArc((1.7783112907744663, -3.9699003706850946), (3.0759144981852824, -3.0759144981550013), (3.969900370709908, -1.7783112907404184))
            Line((3.969900370709908, -1.7783112907404184), (5.24756945553051, -2.350641361323541))
            ThreePointArc((5.24756945553051, -2.350641361323541), (4.065863991848536, -4.065863991814081), (2.3506413613629764, -5.247569455503285))
        make_face()
        with BuildLine():
            Line((-5.247569455485965, -2.3506413613456574), (-3.9699003706677742, -1.778311290757147))
            ThreePointArc((-3.9699003706677742, -1.778311290757147), (-3.0759144981376823, -3.0759144981679625), (-1.7783112907230985, -3.9699003706925886))
            Line((-1.7783112907230985, -3.9699003706925886), (-2.350641361306221, -5.247569455513191))
            ThreePointArc((-2.350641361306221, -5.247569455513191), (-4.0658639917967605, -4.0658639918312165), (-5.247569455485965, -2.3506413613456574))
        make_face()
    extrude(amount=CORTAR_EXTRUIR3_DEPTH, mode=Mode.SUBTRACT)


solid = part.part
